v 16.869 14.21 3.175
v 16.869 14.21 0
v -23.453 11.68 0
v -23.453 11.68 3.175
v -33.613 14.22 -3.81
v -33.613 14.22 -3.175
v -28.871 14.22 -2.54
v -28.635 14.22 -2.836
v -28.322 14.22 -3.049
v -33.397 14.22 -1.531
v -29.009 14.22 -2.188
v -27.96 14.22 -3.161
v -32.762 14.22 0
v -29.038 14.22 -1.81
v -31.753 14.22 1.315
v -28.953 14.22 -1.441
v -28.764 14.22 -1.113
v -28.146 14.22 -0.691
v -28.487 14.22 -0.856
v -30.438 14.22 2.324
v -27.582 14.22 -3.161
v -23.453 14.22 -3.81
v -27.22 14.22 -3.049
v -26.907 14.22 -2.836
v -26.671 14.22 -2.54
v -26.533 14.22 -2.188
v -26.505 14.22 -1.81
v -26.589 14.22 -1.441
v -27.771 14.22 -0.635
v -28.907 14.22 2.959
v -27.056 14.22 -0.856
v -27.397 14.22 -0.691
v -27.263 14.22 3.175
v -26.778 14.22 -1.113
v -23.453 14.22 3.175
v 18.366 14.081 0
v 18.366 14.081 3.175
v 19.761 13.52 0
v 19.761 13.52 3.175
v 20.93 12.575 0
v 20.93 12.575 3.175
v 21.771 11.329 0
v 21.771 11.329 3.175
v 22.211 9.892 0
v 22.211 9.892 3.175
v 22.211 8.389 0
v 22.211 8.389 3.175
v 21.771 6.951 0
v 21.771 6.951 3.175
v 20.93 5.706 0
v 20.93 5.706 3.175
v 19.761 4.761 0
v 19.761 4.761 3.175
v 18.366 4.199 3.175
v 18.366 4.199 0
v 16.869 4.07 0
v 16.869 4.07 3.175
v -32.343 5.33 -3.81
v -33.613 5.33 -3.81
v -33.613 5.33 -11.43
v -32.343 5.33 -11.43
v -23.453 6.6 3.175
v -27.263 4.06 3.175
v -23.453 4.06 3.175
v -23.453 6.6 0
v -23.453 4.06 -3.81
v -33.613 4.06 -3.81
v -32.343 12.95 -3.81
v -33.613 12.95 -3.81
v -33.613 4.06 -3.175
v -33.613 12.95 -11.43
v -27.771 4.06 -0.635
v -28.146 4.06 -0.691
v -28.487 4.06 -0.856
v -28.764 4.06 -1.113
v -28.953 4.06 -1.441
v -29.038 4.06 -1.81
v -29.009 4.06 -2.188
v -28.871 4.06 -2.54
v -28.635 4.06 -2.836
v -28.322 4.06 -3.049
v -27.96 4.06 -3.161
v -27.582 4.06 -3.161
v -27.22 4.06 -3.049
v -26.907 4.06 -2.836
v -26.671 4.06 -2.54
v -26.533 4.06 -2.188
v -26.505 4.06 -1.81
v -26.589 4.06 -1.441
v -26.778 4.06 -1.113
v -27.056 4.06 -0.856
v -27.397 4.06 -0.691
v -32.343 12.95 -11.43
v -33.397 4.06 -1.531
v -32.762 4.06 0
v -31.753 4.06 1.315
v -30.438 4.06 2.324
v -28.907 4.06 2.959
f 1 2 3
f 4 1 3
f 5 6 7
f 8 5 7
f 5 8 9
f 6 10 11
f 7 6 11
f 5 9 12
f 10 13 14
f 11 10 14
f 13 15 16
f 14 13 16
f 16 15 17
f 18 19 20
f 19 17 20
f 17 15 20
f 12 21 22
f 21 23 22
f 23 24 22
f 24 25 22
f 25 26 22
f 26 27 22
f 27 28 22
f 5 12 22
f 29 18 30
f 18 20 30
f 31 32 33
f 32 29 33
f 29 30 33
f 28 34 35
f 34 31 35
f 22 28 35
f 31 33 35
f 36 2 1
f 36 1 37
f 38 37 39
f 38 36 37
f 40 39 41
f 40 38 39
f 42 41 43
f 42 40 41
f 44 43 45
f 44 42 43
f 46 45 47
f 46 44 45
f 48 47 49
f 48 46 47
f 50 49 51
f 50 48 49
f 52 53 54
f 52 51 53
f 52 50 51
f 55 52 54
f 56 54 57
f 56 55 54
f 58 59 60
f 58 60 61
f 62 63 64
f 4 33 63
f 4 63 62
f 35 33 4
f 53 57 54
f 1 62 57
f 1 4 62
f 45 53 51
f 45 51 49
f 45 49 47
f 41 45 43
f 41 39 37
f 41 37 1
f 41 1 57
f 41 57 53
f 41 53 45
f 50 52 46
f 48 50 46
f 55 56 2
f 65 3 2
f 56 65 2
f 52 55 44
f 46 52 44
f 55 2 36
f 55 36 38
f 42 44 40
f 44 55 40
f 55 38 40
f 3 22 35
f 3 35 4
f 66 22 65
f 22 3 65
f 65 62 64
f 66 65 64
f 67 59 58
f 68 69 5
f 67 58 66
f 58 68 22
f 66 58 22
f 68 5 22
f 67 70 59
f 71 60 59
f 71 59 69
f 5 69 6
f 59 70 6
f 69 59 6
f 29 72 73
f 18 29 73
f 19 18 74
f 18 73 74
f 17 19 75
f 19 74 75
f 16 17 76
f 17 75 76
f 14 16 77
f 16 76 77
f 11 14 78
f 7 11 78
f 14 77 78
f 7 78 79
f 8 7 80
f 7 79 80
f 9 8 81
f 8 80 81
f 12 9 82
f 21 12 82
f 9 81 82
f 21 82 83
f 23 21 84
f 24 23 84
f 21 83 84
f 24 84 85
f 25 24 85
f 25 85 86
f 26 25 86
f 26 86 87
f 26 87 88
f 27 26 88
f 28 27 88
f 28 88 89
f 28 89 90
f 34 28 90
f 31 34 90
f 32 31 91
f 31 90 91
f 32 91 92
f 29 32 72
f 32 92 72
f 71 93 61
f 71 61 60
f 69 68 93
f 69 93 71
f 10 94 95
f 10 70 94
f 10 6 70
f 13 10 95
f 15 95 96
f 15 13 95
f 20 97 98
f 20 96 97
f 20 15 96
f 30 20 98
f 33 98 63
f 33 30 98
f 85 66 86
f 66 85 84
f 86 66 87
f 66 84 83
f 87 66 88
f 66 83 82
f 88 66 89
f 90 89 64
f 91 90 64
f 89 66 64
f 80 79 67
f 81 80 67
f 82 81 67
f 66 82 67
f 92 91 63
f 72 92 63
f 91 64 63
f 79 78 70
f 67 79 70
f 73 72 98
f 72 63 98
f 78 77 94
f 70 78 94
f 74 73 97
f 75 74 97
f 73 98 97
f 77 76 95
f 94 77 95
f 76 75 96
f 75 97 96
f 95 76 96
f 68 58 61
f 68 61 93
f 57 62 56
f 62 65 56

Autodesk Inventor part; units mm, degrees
ref_plane "YZ Plane" through (0, 0, 0) normal (1, 0, 0) x (0, 1, 0)
ref_plane "XZ Plane" through (0, 0, 0) normal (0, 1, 0) x (-1, 0, 0)
ref_plane "XY Plane" through (0, 0, 0) normal (0, 0, 1) x (1, 0, 0)
sketch "Sketch1" plane through (0, 0, 0) normal (0, 0, 1) x (1, 0, 0)
  line L0 (-23.4532, 11.6803) -> (-23.4532, 6.6003)
  line L1 (-23.4532, 6.6003) -> (16.8687, 4.0703)
  arc A0 (16.8687, 4.0703) -> (16.8687, 14.2103) centre (17.1868, 9.1403) ccw
  line L2 (16.8687, 14.2103) -> (-23.4532, 11.6803)
  line L3 (-5.5783, 9.1403) -> (17.1868, 9.1403) construction
  dimension "d0" = 5.08
  dimension "d1" = 40.64
  dimension "d2" = 5.08
extrude "Extrusion1" add sketch "Sketch1" along normal blind 3.175
sketch "Sketch2" plane through (0, 0, 3.175) normal (0, 0, 1) x (1, 0, 0)
  line L0 (-23.4532, 6.6003) -> (-23.4532, 11.6803) projected
  arc A0 (16.8687, 4.0703) -> (16.8687, 14.2103) centre (17.1868, 9.1403) ccw projected
  line L1 (-23.4532, 4.0603) -> (-33.6132, 4.0603)
  line L2 (-33.6132, 4.0603) -> (-33.6132, 14.2203)
  line L3 (-33.6132, 14.2203) -> (-23.4532, 14.2203)
  line L4 (-23.4532, 14.2203) -> (-23.4532, 4.0603)
  line L5 (17.1868, 9.1403) -> (-29.1497, 9.1403) construction
  dimension "d6" = 10.16
  dimension "d7" = 10.16
  dimension "d8" = 5.08
extrude "Extrusion2" add sketch "Sketch2" against normal blind 6.985
sketch "Sketch3" plane through (0, 0, -3.81) normal (0, 0, -1) x (-1, 0, 0)
  line L0 (33.6132, 14.2203) -> (33.6132, 4.0603) projected
  line L1 (32.3432, 12.9503) -> (33.6132, 12.9503)
  line L2 (33.6132, 12.9503) -> (33.6132, 5.3303)
  line L3 (33.6132, 5.3303) -> (32.3432, 5.3303)
  line L4 (32.3432, 5.3303) -> (32.3432, 12.9503)
  dimension "d11" = 1.27
  dimension "d12" = 7.62
  dimension "d13" = 1.27
extrude "Extrusion3" add sketch "Sketch3" along normal blind 7.62
fillet "Fillet1" radius 6.35 1 edges at (-33.6132, 9.1403, 3.175)
sketch "Sketch4" plane through (-33.6132, 14.2203, -3.81) normal (0, 1, 0) x (1, 0, 0)
  point P0 (10.16, 0)
  point P1 (5.842, -1.905)
  dimension "d17" = 4.318
  dimension "d18" = 1.905
hole "Hole1" at (-27.7712, 14.2203, -1.905) direction (0, -1, 0) diameter 2.54 end through all
properties part number "handle"
